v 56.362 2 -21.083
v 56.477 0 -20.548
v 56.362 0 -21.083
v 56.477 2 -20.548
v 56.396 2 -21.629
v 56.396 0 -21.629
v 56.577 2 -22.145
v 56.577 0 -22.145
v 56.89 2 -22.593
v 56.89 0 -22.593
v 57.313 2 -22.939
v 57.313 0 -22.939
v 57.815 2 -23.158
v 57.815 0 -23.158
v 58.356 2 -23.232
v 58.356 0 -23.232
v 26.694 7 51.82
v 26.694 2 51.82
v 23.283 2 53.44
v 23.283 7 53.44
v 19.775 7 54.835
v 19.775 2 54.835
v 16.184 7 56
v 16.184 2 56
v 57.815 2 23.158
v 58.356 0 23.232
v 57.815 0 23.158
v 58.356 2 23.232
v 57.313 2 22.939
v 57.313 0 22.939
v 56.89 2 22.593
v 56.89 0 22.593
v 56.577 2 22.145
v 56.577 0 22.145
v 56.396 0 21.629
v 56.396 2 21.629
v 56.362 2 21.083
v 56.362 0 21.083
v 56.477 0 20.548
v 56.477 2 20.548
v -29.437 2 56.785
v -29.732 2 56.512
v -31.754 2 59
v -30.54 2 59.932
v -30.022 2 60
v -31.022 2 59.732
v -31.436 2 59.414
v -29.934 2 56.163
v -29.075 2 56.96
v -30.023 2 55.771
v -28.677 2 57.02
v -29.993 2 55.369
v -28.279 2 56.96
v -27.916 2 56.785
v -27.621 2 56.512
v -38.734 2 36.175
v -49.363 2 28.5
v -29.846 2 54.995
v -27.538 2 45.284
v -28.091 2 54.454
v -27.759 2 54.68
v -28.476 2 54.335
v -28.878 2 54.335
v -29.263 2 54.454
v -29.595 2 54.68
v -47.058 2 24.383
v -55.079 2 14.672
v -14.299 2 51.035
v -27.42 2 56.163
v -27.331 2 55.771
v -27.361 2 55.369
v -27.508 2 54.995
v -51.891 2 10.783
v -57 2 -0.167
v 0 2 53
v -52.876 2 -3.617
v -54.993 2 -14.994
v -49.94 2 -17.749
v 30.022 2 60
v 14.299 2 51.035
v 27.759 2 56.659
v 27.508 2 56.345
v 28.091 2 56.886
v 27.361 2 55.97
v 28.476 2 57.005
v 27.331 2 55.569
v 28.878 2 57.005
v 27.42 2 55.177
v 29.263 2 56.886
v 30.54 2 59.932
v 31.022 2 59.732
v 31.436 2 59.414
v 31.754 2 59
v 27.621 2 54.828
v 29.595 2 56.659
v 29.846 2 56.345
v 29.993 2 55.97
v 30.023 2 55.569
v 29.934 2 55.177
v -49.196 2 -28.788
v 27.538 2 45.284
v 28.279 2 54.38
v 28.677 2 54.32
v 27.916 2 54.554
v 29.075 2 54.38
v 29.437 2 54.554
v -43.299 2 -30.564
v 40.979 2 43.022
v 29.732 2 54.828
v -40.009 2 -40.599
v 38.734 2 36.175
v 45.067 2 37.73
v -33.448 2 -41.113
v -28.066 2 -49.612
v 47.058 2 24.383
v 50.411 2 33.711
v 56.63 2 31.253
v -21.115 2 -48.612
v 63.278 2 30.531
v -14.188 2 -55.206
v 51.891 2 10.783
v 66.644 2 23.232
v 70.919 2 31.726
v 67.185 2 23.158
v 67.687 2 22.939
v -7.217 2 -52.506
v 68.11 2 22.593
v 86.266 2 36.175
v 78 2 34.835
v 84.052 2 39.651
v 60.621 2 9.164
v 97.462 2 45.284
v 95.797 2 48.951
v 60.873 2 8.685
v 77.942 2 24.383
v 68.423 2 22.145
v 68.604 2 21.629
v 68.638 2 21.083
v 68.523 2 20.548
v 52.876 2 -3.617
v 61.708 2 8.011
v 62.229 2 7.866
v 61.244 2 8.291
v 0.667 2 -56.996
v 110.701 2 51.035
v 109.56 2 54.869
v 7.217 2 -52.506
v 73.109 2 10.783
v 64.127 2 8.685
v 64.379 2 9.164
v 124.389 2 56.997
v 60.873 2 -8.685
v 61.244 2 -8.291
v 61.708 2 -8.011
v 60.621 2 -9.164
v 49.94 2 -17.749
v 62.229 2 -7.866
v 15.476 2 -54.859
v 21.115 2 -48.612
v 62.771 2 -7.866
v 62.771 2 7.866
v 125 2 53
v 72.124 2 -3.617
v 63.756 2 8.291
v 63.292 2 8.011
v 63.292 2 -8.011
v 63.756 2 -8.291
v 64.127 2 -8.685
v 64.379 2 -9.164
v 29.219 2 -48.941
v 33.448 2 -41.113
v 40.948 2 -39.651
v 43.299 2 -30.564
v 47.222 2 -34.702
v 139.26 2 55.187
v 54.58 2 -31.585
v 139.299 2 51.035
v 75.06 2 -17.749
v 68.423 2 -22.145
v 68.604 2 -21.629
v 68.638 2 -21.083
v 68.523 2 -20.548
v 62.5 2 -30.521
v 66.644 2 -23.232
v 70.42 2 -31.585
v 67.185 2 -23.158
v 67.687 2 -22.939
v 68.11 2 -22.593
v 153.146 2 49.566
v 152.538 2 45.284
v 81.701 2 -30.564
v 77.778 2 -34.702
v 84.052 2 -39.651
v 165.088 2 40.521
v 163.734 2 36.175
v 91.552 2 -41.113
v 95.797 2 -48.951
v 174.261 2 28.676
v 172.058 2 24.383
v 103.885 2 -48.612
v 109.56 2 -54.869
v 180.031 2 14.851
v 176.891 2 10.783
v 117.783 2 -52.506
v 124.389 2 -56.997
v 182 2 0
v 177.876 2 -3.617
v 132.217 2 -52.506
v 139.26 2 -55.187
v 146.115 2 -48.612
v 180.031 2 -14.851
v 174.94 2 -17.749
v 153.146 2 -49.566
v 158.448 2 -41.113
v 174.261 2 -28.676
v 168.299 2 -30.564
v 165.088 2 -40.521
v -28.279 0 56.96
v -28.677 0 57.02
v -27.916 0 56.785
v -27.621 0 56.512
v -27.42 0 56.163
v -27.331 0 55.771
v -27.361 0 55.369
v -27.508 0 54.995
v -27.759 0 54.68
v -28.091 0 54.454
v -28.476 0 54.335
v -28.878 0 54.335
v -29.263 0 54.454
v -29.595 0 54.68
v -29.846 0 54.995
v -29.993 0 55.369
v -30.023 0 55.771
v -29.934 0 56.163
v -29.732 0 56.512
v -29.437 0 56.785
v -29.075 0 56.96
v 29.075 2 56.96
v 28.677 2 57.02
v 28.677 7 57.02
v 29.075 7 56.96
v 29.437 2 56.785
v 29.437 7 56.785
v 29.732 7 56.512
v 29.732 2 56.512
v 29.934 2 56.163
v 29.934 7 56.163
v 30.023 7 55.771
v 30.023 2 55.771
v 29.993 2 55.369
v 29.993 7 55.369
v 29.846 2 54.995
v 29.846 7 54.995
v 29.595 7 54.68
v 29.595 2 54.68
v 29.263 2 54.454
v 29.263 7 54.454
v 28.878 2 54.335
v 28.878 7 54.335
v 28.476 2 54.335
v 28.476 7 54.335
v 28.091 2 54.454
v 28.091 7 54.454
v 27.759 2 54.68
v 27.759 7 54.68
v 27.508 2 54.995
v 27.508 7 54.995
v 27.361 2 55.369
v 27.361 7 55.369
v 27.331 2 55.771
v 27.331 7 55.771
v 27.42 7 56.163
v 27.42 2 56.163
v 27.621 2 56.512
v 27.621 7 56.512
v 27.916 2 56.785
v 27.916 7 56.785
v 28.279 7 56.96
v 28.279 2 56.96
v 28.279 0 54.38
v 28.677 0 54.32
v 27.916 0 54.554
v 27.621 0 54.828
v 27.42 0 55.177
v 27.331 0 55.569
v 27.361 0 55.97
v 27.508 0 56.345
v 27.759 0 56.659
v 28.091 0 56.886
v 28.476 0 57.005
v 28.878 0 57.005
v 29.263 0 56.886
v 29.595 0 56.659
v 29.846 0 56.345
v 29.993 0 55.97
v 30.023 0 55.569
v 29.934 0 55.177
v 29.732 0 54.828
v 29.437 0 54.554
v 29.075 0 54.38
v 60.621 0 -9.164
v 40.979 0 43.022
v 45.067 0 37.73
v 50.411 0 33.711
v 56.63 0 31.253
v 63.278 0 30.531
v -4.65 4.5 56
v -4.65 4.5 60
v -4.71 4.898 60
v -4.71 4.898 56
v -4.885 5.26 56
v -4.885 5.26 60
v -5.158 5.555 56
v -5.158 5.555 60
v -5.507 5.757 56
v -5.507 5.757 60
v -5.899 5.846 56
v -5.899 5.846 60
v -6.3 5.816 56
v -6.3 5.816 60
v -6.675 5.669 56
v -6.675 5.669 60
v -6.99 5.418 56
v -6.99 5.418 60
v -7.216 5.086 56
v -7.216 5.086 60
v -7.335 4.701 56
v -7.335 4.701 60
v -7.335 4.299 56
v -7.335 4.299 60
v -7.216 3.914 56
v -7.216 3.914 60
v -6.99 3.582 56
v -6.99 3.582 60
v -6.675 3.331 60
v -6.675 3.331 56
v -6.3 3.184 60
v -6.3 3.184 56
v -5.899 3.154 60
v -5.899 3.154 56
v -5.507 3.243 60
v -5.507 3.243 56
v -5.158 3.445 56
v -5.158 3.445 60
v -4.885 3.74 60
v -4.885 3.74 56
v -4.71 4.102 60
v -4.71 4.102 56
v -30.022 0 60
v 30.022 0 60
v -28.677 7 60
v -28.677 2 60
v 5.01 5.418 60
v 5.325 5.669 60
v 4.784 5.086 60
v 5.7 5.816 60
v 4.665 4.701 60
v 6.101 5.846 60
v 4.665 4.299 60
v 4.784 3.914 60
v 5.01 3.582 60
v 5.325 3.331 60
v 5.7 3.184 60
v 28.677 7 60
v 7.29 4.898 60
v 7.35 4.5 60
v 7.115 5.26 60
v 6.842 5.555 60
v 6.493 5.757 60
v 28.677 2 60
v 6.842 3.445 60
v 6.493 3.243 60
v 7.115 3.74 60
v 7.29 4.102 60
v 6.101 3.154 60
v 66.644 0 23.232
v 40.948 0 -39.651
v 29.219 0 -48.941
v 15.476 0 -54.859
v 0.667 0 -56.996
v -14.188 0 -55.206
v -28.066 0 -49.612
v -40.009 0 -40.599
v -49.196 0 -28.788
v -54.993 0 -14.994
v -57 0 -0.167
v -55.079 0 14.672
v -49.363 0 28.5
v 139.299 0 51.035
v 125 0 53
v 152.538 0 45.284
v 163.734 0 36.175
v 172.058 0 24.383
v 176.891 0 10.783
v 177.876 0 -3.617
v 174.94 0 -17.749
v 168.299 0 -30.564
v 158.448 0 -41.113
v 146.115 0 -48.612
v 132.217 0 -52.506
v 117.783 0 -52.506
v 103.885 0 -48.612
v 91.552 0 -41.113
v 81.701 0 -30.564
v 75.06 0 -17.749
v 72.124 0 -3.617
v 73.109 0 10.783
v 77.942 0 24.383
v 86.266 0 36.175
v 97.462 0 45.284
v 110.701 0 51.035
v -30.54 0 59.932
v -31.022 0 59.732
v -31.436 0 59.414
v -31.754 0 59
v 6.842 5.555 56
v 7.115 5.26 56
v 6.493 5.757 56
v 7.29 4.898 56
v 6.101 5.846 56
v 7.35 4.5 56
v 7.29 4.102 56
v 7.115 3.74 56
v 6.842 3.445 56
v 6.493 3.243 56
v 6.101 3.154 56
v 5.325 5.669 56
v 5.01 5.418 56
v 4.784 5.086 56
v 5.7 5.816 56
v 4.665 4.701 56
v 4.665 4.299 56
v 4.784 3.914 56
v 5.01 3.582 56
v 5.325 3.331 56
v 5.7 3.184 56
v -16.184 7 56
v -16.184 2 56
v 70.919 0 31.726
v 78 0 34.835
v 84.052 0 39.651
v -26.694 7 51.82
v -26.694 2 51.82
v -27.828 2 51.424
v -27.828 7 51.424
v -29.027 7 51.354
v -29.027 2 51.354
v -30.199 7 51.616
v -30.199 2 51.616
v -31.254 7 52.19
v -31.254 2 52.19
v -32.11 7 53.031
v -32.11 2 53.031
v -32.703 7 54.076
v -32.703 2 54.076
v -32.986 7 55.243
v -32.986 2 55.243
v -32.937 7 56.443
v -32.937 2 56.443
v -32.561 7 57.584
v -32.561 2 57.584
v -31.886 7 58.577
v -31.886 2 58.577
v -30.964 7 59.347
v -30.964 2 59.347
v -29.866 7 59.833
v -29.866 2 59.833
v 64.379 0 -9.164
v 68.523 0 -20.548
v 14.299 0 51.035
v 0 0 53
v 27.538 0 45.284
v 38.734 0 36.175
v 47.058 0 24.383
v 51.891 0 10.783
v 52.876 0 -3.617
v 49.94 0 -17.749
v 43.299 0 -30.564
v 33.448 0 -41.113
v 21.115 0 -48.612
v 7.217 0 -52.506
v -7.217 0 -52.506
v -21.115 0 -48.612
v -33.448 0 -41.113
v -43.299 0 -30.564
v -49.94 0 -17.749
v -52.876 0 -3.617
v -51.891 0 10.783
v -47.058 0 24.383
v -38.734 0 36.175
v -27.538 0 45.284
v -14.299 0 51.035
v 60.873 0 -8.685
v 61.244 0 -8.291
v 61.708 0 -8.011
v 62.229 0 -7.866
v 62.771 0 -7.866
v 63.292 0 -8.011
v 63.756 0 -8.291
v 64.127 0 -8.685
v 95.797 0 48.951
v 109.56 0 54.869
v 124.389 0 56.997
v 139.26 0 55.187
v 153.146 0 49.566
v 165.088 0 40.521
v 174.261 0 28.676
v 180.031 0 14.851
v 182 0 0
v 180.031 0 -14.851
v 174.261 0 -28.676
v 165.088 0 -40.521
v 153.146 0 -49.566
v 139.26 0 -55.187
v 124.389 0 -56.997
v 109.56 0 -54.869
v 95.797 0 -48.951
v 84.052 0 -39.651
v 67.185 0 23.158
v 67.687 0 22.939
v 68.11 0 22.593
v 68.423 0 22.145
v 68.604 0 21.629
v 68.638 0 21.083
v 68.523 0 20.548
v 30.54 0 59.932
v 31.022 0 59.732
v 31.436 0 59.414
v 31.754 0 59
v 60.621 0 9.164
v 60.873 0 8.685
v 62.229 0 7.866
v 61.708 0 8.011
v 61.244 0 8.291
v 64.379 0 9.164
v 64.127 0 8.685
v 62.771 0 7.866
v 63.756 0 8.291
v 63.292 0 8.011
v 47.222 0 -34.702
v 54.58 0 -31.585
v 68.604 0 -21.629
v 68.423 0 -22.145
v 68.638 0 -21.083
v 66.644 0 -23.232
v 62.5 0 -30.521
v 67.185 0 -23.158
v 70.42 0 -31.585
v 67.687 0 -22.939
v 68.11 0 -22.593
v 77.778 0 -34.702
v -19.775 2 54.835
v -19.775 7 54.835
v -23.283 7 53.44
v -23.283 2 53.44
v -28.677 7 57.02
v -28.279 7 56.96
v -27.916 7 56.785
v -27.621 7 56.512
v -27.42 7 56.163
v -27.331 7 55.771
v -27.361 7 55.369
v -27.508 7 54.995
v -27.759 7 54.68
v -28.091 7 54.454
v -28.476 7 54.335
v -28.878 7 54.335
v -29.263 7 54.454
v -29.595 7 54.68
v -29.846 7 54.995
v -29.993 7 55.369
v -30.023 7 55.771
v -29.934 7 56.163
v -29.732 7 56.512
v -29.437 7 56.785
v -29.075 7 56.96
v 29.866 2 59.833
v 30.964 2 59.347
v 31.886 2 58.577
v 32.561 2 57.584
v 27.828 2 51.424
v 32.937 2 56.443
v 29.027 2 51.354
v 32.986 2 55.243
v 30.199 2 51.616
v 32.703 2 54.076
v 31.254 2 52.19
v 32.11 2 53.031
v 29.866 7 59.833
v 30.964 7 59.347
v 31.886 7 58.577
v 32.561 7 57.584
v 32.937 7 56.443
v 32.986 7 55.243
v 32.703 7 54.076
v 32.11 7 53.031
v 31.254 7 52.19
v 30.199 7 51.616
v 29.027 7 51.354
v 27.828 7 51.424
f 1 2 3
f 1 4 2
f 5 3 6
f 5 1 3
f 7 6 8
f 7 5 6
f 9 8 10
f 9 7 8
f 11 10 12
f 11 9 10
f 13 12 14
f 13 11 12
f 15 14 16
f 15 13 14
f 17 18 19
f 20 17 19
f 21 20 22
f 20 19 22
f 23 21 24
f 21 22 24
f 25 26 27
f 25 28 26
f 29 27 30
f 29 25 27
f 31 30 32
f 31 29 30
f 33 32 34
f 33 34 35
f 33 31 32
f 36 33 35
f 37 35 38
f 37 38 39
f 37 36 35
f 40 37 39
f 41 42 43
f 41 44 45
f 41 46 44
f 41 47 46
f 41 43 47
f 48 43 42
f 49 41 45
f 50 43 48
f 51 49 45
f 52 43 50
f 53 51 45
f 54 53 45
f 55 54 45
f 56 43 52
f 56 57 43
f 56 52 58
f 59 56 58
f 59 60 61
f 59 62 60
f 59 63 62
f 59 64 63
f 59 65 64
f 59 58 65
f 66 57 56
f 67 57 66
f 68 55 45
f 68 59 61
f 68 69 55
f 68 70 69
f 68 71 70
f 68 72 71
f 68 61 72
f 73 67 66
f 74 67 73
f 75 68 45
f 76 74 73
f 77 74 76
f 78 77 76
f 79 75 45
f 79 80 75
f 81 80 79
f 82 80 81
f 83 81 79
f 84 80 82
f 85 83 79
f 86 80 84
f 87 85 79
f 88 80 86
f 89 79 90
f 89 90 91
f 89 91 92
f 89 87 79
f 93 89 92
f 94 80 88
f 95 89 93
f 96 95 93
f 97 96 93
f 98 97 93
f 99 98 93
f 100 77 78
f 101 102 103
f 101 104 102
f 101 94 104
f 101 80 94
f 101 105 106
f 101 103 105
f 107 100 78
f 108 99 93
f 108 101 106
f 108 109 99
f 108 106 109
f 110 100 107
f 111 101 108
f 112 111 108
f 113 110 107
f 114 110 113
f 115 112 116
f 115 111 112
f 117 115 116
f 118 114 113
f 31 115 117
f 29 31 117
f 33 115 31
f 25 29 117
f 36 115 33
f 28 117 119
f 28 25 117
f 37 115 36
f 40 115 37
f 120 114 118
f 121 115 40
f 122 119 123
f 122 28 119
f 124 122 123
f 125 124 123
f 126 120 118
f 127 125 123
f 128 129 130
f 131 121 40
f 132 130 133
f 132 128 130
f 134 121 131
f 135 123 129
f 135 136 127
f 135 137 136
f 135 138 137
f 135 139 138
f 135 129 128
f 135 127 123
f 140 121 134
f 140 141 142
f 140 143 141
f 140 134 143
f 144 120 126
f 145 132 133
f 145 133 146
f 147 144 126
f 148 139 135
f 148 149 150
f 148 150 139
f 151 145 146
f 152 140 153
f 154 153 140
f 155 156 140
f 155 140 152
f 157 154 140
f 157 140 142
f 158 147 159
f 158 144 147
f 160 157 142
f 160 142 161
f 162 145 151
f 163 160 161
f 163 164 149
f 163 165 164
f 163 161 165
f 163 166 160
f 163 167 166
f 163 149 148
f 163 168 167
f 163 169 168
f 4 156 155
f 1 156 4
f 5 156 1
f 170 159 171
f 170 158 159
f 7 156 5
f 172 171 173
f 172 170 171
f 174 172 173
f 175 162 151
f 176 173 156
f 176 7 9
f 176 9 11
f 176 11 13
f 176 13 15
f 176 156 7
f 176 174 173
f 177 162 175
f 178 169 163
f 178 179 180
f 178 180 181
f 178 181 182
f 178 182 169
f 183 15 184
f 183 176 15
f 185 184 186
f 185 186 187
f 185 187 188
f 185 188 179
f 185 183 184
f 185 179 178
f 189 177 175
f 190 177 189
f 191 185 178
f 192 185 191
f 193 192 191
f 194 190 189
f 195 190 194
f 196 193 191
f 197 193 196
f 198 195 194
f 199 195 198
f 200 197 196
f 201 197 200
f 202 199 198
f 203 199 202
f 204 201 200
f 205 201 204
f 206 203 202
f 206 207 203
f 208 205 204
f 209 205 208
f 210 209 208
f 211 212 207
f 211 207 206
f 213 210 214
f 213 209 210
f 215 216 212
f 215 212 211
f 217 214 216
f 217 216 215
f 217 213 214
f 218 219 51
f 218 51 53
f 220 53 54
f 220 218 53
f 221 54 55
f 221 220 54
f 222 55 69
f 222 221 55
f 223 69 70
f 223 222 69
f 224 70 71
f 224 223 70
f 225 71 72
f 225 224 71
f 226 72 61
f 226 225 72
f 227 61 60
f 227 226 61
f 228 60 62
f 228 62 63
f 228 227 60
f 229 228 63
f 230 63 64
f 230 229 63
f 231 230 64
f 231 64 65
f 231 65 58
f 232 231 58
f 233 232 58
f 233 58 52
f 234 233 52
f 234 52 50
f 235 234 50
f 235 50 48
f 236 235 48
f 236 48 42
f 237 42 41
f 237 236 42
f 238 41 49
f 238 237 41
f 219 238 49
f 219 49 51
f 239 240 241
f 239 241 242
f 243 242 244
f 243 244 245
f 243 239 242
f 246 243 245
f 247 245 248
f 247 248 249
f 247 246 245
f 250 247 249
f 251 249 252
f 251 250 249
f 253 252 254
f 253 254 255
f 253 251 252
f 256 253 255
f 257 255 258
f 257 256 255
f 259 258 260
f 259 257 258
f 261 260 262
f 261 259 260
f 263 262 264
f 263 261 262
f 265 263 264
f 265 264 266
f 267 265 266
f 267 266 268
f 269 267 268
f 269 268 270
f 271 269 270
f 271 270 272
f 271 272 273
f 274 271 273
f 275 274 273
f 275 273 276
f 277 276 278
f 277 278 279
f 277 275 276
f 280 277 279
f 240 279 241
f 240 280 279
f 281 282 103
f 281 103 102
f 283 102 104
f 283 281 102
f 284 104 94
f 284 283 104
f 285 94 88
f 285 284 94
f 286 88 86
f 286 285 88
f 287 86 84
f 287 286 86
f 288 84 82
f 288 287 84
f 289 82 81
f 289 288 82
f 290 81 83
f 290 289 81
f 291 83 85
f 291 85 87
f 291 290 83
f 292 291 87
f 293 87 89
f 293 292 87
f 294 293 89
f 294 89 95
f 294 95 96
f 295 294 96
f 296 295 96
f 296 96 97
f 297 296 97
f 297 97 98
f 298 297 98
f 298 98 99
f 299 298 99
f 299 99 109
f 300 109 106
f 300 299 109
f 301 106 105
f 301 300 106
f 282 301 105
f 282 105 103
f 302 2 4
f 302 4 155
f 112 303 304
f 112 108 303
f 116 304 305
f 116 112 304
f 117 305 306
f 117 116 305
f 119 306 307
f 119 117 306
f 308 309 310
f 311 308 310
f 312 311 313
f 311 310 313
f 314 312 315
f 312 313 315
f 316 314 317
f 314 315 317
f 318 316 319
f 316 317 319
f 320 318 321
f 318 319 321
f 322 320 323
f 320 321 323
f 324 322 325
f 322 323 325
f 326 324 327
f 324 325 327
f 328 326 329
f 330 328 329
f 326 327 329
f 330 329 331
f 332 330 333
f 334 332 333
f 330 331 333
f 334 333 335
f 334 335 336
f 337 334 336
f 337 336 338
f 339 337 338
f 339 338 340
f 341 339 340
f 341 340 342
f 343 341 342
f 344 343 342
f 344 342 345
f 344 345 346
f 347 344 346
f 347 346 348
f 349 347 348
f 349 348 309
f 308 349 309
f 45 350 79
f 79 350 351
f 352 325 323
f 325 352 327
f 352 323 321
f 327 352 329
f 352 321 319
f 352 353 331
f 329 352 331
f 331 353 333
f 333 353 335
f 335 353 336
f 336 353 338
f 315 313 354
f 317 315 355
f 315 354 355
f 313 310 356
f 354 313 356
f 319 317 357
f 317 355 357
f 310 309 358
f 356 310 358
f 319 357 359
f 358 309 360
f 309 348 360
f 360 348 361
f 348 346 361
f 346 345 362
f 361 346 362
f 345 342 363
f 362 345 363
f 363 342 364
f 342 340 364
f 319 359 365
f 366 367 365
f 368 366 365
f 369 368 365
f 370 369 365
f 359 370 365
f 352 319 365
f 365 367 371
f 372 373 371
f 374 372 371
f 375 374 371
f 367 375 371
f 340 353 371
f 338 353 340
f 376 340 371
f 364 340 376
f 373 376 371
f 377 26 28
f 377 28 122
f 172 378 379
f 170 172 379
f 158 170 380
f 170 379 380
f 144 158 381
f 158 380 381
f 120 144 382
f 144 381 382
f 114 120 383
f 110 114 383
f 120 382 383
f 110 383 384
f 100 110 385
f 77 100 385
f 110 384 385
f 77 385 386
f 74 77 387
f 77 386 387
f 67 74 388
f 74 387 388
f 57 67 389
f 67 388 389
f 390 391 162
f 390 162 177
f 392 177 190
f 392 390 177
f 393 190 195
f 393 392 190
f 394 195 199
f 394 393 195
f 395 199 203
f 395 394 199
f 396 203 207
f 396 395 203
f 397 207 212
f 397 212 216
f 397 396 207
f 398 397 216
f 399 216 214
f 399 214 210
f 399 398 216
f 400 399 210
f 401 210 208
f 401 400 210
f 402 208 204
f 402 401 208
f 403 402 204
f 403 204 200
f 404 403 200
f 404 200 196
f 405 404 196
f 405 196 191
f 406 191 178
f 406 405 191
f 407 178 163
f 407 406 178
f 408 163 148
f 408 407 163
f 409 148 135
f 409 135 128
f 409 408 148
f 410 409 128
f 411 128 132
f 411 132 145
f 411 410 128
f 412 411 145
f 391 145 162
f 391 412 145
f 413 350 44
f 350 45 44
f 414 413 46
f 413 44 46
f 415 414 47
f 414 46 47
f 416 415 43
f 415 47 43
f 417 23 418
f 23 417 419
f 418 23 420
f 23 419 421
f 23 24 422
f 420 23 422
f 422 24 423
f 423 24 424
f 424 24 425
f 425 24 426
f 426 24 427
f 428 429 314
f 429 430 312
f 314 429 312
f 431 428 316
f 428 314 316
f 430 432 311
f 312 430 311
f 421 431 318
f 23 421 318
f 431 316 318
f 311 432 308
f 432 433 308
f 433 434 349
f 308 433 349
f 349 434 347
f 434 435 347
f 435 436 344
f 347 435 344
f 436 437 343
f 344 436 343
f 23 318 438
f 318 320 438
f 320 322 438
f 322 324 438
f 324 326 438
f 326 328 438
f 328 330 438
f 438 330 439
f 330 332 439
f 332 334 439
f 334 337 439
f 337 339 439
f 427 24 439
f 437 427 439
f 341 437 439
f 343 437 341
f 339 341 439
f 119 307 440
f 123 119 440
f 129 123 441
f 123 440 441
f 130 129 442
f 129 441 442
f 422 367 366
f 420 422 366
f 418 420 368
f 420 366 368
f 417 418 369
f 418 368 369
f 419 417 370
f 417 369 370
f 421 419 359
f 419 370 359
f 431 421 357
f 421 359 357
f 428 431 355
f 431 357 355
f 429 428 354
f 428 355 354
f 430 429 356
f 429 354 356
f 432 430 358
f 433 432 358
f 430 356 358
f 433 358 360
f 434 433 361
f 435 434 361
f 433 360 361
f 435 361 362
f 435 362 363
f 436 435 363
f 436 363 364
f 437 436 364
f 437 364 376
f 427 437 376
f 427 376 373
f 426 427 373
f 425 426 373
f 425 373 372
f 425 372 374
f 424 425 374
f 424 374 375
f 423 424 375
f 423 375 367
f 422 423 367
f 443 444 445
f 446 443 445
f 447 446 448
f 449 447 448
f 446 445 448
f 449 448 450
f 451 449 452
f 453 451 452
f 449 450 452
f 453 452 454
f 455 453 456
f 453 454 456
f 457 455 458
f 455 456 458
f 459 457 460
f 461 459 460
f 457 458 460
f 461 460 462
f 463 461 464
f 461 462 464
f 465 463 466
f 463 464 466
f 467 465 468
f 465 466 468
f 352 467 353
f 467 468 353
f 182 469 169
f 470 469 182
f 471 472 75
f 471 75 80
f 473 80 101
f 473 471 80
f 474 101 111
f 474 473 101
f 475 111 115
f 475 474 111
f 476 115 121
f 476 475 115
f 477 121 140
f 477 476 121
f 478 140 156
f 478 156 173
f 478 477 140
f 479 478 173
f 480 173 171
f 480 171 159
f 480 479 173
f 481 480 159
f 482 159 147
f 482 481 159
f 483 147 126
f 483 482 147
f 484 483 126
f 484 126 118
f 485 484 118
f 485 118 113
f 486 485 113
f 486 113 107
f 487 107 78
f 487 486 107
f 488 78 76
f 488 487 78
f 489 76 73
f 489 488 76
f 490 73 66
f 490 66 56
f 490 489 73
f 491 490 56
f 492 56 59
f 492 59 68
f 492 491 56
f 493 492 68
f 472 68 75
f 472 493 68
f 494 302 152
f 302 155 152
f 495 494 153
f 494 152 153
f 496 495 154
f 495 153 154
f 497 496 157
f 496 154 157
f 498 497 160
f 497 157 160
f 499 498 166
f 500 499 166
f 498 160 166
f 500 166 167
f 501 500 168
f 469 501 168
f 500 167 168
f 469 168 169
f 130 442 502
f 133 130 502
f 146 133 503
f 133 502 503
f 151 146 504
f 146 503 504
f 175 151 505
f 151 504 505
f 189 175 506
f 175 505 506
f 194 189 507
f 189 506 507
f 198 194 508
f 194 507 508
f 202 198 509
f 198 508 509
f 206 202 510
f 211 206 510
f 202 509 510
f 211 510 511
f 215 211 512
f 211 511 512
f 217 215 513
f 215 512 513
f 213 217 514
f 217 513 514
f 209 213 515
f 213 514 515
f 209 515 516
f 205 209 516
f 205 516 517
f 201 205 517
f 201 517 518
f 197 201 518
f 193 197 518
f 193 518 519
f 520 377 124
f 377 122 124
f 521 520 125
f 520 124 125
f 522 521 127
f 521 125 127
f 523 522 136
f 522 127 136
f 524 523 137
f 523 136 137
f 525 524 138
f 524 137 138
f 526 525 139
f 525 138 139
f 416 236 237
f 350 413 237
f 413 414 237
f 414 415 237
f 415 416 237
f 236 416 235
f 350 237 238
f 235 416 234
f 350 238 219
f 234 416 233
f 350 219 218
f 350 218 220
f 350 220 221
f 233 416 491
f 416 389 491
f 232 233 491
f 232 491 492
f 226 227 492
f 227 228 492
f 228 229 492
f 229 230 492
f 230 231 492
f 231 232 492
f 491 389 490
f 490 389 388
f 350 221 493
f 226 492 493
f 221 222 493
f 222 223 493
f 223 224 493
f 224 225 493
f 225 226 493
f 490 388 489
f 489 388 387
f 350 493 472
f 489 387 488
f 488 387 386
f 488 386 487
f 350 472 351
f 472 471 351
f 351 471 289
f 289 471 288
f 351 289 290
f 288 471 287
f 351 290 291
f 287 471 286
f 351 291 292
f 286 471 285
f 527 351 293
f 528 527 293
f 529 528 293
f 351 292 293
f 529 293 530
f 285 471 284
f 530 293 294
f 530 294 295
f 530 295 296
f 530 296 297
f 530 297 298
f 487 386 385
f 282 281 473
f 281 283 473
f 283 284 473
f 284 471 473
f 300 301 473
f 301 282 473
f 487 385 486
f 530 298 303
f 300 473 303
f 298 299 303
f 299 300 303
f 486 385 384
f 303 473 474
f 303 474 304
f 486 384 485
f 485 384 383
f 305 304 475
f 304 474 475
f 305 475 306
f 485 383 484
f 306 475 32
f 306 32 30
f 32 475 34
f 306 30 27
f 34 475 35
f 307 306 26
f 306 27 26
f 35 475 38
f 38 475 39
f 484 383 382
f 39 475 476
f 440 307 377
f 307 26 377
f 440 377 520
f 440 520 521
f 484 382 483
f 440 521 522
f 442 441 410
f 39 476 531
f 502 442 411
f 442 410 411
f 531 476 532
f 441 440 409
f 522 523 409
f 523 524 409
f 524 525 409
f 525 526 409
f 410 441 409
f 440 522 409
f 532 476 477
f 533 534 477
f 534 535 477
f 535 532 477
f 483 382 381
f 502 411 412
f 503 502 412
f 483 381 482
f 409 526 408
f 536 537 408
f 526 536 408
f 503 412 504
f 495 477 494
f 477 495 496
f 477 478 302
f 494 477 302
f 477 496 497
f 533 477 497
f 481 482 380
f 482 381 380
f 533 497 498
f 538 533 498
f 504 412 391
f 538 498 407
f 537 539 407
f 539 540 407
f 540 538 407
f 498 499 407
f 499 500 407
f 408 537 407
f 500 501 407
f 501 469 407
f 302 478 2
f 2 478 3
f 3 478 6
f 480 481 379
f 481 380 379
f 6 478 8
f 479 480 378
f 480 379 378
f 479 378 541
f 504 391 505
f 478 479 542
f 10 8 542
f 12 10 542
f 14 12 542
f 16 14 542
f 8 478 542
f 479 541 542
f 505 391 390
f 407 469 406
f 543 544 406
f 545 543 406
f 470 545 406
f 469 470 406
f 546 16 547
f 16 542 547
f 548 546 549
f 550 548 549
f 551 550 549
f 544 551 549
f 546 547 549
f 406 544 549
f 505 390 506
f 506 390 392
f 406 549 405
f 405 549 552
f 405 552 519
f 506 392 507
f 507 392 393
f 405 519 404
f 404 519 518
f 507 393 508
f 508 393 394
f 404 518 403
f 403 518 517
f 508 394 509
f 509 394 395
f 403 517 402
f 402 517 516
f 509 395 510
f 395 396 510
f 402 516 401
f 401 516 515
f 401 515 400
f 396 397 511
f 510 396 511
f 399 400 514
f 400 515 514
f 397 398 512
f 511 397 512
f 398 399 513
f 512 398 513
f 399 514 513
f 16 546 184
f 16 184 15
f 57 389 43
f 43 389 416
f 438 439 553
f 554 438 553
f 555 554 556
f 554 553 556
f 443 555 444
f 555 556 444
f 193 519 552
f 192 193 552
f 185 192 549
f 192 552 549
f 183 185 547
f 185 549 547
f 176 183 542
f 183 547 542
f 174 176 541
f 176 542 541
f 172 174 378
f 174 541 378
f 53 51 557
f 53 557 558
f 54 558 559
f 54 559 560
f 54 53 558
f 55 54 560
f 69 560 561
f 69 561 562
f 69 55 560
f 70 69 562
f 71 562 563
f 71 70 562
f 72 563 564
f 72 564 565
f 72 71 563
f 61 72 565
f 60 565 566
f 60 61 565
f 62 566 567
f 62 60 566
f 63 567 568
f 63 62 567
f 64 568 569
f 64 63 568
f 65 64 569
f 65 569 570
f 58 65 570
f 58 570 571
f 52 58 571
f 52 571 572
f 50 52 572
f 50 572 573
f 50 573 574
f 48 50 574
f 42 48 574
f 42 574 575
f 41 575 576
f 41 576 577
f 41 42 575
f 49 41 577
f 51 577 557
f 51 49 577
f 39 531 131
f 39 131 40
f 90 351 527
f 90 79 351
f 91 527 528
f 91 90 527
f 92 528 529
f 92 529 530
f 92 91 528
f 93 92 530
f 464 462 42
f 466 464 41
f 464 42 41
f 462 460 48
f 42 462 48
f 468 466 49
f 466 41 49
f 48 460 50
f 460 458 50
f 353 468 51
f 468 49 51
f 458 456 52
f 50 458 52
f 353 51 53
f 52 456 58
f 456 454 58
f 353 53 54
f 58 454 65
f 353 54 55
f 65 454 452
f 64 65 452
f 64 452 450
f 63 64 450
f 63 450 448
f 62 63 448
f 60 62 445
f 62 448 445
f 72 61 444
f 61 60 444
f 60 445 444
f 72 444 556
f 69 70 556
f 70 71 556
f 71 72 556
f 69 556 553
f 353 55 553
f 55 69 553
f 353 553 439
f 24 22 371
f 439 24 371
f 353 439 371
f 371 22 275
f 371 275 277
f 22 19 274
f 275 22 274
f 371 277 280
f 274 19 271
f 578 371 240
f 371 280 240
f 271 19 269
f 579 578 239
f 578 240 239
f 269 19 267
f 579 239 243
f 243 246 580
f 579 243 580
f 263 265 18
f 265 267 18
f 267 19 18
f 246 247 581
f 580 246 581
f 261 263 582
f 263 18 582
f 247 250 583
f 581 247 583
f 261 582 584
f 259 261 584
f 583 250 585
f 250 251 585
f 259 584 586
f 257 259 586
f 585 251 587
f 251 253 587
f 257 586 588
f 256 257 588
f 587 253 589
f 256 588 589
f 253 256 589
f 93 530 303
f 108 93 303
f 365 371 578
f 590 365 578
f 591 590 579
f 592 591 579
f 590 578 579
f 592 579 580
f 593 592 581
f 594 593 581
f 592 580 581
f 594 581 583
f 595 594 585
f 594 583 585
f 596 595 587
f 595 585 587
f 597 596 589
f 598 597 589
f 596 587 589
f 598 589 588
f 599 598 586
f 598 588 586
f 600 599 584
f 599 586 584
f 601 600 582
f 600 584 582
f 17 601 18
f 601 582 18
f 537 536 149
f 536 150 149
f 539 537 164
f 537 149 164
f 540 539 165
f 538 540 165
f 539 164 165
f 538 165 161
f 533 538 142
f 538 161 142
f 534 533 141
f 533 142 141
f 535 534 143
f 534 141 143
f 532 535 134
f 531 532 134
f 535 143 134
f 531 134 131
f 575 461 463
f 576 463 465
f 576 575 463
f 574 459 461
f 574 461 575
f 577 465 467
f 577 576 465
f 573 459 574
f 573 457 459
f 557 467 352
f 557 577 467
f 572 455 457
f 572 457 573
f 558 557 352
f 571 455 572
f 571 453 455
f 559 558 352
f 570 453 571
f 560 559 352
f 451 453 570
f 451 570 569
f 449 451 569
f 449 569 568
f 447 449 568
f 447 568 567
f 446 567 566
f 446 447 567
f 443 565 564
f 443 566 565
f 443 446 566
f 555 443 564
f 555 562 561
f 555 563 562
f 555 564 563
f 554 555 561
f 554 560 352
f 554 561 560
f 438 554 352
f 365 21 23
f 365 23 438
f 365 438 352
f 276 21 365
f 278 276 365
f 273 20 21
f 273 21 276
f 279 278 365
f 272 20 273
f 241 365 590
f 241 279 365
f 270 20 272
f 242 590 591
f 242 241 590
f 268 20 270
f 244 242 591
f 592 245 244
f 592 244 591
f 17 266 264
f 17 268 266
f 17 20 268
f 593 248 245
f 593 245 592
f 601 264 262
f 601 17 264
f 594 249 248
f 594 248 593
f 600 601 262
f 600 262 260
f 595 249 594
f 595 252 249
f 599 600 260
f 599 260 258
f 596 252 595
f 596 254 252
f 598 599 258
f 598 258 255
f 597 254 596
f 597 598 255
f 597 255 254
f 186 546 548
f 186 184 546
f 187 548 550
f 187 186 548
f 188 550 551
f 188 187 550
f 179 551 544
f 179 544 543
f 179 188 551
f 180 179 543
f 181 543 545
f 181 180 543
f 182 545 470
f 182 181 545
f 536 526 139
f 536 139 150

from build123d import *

# Parameters (mm, degrees)
SKETCH_1_R          = 53
SKETCH_1_R_2        = 1.35
EXTRUDE_1_DEPTH     = 2
FILLET_1_R          = 2
FILLET_2_R          = 25
SKETCH_12_R         = 1.35
EXTRUDE_6_DEPTH     = 5
SKETCH_13_R         = 1.35
CUT_EXTRUDE_1_DEPTH = 217.47632665


with BuildPart() as part:
    # 草图1 → 凸台-拉伸1 (new body)
    with BuildSketch(Plane(origin=(0, 0, 0), x_dir=(1, 0, 0), z_dir=(0, 1, 0))):
        with BuildLine():
            Line((-31.176914536, -60), (31.176914536, -60))
            Line((31.176914536, -60), (44.905077049, -36.222125034))
            ThreePointArc((44.905077049, -36.222125034), (65.118045578, -30.635112004), (84.051724138, -39.651465344))
            ThreePointArc((84.051724138, -39.651465344), (182, 0), (84.051724138, 39.651465344))
            ThreePointArc((84.051724138, 39.651465344), (62.5, 30.52065763), (40.948275862, 39.651465344))
            ThreePointArc((40.948275862, 39.651465344), (-34.334521079, 45.498798471), (-49.363448016, -28.5))
            Line((-49.363448016, -28.5), (-31.176914536, -60))
        make_face()
        with Locations(Location((0, 0, 0), (0, 0, 270))):
            Circle(SKETCH_1_R, mode=Mode.SUBTRACT)
        with Locations(Location((125, 0, 0), (0, 0, 270))):
            Circle(SKETCH_1_R, mode=Mode.SUBTRACT)
        with Locations(Location((-28.676914536, -55.669872981, 0), (0, 0, 270))):
            Circle(SKETCH_1_R_2, mode=Mode.SUBTRACT)
        with Locations(Location((28.676914536, -55.669872981, 0), (0, 0, 90))):
            Circle(SKETCH_1_R_2, mode=Mode.SUBTRACT)
        Polygon((55.5, 23.232341936), (62.5, 4), (69.5, 23.232341936), align=None, mode=Mode.SUBTRACT)
        Polygon((55.5, -23.232341936), (69.5, -23.232341936), (62.5, -4), align=None, mode=Mode.SUBTRACT)
    extrude(amount=EXTRUDE_1_DEPTH)

    # 圆角1
    fillet_1_edges = [part.edges().sort_by_distance(p)[0] for p in [
        (31.176914536, 1, 60),
        (-31.176914536, 1, 60),
        (69.5, 1, -23.232341936),
        (55.5, 1, -23.232341936),
        (62.5, 1, -4),
        (62.5, 1, 4),
        (55.5, 1, 23.232341936),
        (69.5, 1, 23.232341936),
    ]]
    fillet(fillet_1_edges, radius=FILLET_1_R)

    # 圆角2
    fillet_2_edges = [part.edges().sort_by_distance(p)[0] for p in [
        (44.905077049, 1, 36.222125034),
    ]]
    fillet(fillet_2_edges, radius=FILLET_2_R)


with BuildPart() as body_2:
    # 草图12 → 凸台-拉伸6 (new body)
    with BuildSketch(Plane(origin=(0, 2, 0), x_dir=(1, 0, 0), z_dir=(0, 1, 0))):
        with BuildLine():
            Line((-28.676914536, -60), (28.676914536, -60))
            ThreePointArc((28.676914536, -60), (32.885147917, -54.649690735), (26.693986569, -51.820457873))
            ThreePointArc((26.693986569, -51.820457873), (21.540709312, -54.165732852), (16.1842137, -56))
            Line((16.1842137, -56), (-16.1842137, -56))
            ThreePointArc((-16.1842137, -56), (-21.540709312, -54.165732852), (-26.693986569, -51.820457873))
            ThreePointArc((-26.693986569, -51.820457873), (-32.885147917, -54.649690735), (-28.676914536, -60))
        make_face()
        with Locations(Location((-28.676914536, -55.669872981, 0), (0, 0, 270))):
            Circle(SKETCH_12_R, mode=Mode.SUBTRACT)
        with Locations(Location((28.676914536, -55.669872981, 0), (0, 0, 270))):
            Circle(SKETCH_12_R, mode=Mode.SUBTRACT)
    extrude(amount=EXTRUDE_6_DEPTH)

    # 草图13 → 切除-拉伸1 (cut, through all)
    with BuildSketch(Plane.XY.offset(60)):
        with Locations((-6, 4.5)):
            Circle(SKETCH_13_R)
        with Locations((6, 4.5)):
            Circle(SKETCH_13_R)
    extrude(amount=-CUT_EXTRUDE_1_DEPTH, mode=Mode.SUBTRACT)


solid = Compound([part.part, body_2.part])
